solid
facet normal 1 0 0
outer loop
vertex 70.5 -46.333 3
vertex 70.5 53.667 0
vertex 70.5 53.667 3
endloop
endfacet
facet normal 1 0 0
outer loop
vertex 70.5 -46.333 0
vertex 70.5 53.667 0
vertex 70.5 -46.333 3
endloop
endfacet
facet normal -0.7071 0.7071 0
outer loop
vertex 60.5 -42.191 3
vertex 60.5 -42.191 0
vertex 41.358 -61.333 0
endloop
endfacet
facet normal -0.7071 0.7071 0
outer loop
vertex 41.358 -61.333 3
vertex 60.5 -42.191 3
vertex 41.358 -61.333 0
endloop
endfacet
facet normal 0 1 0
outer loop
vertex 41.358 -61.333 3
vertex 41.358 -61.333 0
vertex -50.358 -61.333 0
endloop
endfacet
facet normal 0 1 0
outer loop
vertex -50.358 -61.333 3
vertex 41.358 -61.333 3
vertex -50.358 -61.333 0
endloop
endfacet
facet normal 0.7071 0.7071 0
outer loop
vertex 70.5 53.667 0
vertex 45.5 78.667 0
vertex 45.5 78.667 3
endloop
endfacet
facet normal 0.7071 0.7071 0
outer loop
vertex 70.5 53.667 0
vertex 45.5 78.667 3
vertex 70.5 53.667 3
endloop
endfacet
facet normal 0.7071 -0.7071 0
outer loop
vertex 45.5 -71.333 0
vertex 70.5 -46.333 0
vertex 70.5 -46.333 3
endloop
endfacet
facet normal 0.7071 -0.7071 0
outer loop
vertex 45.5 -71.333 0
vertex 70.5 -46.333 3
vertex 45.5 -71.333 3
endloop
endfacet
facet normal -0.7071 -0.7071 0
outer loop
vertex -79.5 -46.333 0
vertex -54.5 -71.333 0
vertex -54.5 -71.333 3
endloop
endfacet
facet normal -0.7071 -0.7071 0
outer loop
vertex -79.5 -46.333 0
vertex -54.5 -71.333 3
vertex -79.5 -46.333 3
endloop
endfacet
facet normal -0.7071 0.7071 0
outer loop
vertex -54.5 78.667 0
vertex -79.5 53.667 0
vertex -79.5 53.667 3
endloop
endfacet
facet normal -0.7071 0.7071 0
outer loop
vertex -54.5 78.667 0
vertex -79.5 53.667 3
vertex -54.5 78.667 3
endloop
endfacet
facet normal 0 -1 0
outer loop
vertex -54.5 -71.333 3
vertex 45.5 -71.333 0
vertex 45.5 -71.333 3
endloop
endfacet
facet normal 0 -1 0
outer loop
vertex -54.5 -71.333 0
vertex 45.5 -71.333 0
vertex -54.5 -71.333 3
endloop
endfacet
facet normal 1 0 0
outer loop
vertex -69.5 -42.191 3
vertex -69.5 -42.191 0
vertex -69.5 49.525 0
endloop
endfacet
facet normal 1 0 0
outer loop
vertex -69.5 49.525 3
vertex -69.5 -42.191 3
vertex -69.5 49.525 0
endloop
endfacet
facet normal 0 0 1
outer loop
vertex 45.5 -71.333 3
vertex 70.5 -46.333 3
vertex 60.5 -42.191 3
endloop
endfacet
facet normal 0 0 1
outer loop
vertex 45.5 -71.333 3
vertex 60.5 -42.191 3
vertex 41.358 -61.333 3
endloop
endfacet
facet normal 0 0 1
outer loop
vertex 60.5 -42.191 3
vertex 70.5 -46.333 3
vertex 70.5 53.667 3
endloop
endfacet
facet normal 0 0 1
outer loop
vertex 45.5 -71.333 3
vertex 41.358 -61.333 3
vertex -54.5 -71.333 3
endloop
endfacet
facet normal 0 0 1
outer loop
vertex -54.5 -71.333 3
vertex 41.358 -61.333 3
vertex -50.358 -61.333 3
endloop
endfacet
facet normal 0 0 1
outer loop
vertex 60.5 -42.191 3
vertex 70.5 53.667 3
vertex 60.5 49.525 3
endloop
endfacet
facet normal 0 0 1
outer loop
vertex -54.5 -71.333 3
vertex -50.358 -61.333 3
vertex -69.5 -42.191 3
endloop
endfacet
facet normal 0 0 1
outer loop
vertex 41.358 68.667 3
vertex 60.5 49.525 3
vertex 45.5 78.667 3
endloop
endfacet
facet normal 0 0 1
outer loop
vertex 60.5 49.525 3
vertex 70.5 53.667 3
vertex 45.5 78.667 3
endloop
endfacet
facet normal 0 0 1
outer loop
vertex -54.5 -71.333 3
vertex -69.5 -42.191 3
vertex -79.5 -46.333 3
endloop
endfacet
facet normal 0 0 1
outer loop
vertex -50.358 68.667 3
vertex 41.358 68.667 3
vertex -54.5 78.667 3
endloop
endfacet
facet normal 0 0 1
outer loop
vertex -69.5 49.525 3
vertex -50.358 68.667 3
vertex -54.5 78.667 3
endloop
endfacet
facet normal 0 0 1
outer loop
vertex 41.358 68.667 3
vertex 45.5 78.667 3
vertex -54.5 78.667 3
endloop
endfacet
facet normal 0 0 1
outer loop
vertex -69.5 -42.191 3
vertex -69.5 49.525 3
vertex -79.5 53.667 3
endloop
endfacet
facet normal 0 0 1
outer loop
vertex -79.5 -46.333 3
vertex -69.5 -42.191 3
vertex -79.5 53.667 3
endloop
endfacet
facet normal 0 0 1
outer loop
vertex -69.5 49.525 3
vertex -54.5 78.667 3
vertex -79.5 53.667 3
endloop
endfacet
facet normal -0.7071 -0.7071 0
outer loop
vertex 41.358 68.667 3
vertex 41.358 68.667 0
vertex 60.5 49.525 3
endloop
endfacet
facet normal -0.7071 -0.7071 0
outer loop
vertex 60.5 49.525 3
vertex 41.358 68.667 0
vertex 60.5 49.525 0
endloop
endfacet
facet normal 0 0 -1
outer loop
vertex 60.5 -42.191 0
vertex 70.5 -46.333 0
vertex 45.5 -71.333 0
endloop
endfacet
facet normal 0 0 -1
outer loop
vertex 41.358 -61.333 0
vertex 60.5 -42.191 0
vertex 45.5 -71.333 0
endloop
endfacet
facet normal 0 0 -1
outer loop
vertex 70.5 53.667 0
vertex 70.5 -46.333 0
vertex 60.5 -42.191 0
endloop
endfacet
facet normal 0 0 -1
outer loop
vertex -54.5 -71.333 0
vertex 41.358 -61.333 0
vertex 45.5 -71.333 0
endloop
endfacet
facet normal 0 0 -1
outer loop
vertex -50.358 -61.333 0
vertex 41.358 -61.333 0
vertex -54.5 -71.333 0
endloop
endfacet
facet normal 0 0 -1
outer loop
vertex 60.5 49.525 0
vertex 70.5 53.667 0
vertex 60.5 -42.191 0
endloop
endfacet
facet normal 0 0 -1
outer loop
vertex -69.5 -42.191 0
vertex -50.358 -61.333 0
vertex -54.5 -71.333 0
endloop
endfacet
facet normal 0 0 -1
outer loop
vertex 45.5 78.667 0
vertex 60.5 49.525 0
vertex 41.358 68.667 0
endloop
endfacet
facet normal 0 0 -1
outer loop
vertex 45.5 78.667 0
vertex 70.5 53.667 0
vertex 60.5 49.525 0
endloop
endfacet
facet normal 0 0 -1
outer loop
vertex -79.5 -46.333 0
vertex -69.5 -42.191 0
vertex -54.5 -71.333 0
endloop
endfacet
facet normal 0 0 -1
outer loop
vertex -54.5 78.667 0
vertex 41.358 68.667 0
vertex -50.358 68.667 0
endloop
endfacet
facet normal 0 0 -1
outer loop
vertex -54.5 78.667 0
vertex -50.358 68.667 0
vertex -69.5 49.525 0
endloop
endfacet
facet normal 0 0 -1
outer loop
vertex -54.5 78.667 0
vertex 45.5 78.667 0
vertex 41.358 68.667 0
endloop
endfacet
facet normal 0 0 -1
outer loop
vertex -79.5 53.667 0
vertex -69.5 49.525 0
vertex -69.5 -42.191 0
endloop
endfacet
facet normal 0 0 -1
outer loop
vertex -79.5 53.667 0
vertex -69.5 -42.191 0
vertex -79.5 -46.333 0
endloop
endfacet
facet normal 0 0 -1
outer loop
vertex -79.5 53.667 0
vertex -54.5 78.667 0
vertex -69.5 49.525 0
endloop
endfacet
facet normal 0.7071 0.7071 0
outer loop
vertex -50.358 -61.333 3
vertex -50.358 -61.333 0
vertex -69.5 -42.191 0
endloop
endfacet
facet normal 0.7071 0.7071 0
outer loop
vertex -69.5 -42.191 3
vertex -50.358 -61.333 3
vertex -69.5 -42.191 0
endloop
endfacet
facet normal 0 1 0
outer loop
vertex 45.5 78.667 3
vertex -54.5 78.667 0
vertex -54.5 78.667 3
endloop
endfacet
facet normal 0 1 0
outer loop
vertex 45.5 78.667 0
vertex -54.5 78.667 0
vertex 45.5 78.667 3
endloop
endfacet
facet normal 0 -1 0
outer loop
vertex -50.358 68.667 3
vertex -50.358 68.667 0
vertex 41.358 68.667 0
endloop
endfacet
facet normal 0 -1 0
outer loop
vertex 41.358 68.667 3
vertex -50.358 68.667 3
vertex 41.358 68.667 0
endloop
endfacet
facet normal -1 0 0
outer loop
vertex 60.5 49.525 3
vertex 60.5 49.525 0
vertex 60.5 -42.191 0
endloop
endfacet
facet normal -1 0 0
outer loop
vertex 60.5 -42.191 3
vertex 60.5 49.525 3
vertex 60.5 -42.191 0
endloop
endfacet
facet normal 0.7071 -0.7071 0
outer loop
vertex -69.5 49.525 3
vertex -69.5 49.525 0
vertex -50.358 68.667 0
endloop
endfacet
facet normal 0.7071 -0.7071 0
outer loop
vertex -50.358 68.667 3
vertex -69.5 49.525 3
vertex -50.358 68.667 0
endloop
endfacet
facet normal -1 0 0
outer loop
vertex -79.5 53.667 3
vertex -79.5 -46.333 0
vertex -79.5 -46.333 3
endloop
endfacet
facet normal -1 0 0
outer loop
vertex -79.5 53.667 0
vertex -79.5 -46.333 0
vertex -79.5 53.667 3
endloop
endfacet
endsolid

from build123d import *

# Parameters (mm, degrees)
BOSS_EXTRUDE1_DEPTH = 3


with BuildPart() as part:
    # Sketch1 → Boss-Extrude1 (new body)
    with BuildSketch(Plane.XY):
        Polygon((45.5, 78.667286245), (70.5, 53.667286245), (70.5, -46.332713755), (45.5, -71.332713755), (-54.5, -71.332713755), (-79.5, -46.332713755), (-79.5, 53.667286245), (-54.5, 78.667286245), align=None)
        Polygon((41.357864376, 68.667286245), (60.5, 49.525150622), (60.5, -42.190578131), (41.357864376, -61.332713755), (-50.357864376, -61.332713755), (-69.5, -42.190578131), (-69.5, 49.525150622), (-50.357864376, 68.667286245), align=None, mode=Mode.SUBTRACT)
    extrude(amount=BOSS_EXTRUDE1_DEPTH)


solid = part.part
